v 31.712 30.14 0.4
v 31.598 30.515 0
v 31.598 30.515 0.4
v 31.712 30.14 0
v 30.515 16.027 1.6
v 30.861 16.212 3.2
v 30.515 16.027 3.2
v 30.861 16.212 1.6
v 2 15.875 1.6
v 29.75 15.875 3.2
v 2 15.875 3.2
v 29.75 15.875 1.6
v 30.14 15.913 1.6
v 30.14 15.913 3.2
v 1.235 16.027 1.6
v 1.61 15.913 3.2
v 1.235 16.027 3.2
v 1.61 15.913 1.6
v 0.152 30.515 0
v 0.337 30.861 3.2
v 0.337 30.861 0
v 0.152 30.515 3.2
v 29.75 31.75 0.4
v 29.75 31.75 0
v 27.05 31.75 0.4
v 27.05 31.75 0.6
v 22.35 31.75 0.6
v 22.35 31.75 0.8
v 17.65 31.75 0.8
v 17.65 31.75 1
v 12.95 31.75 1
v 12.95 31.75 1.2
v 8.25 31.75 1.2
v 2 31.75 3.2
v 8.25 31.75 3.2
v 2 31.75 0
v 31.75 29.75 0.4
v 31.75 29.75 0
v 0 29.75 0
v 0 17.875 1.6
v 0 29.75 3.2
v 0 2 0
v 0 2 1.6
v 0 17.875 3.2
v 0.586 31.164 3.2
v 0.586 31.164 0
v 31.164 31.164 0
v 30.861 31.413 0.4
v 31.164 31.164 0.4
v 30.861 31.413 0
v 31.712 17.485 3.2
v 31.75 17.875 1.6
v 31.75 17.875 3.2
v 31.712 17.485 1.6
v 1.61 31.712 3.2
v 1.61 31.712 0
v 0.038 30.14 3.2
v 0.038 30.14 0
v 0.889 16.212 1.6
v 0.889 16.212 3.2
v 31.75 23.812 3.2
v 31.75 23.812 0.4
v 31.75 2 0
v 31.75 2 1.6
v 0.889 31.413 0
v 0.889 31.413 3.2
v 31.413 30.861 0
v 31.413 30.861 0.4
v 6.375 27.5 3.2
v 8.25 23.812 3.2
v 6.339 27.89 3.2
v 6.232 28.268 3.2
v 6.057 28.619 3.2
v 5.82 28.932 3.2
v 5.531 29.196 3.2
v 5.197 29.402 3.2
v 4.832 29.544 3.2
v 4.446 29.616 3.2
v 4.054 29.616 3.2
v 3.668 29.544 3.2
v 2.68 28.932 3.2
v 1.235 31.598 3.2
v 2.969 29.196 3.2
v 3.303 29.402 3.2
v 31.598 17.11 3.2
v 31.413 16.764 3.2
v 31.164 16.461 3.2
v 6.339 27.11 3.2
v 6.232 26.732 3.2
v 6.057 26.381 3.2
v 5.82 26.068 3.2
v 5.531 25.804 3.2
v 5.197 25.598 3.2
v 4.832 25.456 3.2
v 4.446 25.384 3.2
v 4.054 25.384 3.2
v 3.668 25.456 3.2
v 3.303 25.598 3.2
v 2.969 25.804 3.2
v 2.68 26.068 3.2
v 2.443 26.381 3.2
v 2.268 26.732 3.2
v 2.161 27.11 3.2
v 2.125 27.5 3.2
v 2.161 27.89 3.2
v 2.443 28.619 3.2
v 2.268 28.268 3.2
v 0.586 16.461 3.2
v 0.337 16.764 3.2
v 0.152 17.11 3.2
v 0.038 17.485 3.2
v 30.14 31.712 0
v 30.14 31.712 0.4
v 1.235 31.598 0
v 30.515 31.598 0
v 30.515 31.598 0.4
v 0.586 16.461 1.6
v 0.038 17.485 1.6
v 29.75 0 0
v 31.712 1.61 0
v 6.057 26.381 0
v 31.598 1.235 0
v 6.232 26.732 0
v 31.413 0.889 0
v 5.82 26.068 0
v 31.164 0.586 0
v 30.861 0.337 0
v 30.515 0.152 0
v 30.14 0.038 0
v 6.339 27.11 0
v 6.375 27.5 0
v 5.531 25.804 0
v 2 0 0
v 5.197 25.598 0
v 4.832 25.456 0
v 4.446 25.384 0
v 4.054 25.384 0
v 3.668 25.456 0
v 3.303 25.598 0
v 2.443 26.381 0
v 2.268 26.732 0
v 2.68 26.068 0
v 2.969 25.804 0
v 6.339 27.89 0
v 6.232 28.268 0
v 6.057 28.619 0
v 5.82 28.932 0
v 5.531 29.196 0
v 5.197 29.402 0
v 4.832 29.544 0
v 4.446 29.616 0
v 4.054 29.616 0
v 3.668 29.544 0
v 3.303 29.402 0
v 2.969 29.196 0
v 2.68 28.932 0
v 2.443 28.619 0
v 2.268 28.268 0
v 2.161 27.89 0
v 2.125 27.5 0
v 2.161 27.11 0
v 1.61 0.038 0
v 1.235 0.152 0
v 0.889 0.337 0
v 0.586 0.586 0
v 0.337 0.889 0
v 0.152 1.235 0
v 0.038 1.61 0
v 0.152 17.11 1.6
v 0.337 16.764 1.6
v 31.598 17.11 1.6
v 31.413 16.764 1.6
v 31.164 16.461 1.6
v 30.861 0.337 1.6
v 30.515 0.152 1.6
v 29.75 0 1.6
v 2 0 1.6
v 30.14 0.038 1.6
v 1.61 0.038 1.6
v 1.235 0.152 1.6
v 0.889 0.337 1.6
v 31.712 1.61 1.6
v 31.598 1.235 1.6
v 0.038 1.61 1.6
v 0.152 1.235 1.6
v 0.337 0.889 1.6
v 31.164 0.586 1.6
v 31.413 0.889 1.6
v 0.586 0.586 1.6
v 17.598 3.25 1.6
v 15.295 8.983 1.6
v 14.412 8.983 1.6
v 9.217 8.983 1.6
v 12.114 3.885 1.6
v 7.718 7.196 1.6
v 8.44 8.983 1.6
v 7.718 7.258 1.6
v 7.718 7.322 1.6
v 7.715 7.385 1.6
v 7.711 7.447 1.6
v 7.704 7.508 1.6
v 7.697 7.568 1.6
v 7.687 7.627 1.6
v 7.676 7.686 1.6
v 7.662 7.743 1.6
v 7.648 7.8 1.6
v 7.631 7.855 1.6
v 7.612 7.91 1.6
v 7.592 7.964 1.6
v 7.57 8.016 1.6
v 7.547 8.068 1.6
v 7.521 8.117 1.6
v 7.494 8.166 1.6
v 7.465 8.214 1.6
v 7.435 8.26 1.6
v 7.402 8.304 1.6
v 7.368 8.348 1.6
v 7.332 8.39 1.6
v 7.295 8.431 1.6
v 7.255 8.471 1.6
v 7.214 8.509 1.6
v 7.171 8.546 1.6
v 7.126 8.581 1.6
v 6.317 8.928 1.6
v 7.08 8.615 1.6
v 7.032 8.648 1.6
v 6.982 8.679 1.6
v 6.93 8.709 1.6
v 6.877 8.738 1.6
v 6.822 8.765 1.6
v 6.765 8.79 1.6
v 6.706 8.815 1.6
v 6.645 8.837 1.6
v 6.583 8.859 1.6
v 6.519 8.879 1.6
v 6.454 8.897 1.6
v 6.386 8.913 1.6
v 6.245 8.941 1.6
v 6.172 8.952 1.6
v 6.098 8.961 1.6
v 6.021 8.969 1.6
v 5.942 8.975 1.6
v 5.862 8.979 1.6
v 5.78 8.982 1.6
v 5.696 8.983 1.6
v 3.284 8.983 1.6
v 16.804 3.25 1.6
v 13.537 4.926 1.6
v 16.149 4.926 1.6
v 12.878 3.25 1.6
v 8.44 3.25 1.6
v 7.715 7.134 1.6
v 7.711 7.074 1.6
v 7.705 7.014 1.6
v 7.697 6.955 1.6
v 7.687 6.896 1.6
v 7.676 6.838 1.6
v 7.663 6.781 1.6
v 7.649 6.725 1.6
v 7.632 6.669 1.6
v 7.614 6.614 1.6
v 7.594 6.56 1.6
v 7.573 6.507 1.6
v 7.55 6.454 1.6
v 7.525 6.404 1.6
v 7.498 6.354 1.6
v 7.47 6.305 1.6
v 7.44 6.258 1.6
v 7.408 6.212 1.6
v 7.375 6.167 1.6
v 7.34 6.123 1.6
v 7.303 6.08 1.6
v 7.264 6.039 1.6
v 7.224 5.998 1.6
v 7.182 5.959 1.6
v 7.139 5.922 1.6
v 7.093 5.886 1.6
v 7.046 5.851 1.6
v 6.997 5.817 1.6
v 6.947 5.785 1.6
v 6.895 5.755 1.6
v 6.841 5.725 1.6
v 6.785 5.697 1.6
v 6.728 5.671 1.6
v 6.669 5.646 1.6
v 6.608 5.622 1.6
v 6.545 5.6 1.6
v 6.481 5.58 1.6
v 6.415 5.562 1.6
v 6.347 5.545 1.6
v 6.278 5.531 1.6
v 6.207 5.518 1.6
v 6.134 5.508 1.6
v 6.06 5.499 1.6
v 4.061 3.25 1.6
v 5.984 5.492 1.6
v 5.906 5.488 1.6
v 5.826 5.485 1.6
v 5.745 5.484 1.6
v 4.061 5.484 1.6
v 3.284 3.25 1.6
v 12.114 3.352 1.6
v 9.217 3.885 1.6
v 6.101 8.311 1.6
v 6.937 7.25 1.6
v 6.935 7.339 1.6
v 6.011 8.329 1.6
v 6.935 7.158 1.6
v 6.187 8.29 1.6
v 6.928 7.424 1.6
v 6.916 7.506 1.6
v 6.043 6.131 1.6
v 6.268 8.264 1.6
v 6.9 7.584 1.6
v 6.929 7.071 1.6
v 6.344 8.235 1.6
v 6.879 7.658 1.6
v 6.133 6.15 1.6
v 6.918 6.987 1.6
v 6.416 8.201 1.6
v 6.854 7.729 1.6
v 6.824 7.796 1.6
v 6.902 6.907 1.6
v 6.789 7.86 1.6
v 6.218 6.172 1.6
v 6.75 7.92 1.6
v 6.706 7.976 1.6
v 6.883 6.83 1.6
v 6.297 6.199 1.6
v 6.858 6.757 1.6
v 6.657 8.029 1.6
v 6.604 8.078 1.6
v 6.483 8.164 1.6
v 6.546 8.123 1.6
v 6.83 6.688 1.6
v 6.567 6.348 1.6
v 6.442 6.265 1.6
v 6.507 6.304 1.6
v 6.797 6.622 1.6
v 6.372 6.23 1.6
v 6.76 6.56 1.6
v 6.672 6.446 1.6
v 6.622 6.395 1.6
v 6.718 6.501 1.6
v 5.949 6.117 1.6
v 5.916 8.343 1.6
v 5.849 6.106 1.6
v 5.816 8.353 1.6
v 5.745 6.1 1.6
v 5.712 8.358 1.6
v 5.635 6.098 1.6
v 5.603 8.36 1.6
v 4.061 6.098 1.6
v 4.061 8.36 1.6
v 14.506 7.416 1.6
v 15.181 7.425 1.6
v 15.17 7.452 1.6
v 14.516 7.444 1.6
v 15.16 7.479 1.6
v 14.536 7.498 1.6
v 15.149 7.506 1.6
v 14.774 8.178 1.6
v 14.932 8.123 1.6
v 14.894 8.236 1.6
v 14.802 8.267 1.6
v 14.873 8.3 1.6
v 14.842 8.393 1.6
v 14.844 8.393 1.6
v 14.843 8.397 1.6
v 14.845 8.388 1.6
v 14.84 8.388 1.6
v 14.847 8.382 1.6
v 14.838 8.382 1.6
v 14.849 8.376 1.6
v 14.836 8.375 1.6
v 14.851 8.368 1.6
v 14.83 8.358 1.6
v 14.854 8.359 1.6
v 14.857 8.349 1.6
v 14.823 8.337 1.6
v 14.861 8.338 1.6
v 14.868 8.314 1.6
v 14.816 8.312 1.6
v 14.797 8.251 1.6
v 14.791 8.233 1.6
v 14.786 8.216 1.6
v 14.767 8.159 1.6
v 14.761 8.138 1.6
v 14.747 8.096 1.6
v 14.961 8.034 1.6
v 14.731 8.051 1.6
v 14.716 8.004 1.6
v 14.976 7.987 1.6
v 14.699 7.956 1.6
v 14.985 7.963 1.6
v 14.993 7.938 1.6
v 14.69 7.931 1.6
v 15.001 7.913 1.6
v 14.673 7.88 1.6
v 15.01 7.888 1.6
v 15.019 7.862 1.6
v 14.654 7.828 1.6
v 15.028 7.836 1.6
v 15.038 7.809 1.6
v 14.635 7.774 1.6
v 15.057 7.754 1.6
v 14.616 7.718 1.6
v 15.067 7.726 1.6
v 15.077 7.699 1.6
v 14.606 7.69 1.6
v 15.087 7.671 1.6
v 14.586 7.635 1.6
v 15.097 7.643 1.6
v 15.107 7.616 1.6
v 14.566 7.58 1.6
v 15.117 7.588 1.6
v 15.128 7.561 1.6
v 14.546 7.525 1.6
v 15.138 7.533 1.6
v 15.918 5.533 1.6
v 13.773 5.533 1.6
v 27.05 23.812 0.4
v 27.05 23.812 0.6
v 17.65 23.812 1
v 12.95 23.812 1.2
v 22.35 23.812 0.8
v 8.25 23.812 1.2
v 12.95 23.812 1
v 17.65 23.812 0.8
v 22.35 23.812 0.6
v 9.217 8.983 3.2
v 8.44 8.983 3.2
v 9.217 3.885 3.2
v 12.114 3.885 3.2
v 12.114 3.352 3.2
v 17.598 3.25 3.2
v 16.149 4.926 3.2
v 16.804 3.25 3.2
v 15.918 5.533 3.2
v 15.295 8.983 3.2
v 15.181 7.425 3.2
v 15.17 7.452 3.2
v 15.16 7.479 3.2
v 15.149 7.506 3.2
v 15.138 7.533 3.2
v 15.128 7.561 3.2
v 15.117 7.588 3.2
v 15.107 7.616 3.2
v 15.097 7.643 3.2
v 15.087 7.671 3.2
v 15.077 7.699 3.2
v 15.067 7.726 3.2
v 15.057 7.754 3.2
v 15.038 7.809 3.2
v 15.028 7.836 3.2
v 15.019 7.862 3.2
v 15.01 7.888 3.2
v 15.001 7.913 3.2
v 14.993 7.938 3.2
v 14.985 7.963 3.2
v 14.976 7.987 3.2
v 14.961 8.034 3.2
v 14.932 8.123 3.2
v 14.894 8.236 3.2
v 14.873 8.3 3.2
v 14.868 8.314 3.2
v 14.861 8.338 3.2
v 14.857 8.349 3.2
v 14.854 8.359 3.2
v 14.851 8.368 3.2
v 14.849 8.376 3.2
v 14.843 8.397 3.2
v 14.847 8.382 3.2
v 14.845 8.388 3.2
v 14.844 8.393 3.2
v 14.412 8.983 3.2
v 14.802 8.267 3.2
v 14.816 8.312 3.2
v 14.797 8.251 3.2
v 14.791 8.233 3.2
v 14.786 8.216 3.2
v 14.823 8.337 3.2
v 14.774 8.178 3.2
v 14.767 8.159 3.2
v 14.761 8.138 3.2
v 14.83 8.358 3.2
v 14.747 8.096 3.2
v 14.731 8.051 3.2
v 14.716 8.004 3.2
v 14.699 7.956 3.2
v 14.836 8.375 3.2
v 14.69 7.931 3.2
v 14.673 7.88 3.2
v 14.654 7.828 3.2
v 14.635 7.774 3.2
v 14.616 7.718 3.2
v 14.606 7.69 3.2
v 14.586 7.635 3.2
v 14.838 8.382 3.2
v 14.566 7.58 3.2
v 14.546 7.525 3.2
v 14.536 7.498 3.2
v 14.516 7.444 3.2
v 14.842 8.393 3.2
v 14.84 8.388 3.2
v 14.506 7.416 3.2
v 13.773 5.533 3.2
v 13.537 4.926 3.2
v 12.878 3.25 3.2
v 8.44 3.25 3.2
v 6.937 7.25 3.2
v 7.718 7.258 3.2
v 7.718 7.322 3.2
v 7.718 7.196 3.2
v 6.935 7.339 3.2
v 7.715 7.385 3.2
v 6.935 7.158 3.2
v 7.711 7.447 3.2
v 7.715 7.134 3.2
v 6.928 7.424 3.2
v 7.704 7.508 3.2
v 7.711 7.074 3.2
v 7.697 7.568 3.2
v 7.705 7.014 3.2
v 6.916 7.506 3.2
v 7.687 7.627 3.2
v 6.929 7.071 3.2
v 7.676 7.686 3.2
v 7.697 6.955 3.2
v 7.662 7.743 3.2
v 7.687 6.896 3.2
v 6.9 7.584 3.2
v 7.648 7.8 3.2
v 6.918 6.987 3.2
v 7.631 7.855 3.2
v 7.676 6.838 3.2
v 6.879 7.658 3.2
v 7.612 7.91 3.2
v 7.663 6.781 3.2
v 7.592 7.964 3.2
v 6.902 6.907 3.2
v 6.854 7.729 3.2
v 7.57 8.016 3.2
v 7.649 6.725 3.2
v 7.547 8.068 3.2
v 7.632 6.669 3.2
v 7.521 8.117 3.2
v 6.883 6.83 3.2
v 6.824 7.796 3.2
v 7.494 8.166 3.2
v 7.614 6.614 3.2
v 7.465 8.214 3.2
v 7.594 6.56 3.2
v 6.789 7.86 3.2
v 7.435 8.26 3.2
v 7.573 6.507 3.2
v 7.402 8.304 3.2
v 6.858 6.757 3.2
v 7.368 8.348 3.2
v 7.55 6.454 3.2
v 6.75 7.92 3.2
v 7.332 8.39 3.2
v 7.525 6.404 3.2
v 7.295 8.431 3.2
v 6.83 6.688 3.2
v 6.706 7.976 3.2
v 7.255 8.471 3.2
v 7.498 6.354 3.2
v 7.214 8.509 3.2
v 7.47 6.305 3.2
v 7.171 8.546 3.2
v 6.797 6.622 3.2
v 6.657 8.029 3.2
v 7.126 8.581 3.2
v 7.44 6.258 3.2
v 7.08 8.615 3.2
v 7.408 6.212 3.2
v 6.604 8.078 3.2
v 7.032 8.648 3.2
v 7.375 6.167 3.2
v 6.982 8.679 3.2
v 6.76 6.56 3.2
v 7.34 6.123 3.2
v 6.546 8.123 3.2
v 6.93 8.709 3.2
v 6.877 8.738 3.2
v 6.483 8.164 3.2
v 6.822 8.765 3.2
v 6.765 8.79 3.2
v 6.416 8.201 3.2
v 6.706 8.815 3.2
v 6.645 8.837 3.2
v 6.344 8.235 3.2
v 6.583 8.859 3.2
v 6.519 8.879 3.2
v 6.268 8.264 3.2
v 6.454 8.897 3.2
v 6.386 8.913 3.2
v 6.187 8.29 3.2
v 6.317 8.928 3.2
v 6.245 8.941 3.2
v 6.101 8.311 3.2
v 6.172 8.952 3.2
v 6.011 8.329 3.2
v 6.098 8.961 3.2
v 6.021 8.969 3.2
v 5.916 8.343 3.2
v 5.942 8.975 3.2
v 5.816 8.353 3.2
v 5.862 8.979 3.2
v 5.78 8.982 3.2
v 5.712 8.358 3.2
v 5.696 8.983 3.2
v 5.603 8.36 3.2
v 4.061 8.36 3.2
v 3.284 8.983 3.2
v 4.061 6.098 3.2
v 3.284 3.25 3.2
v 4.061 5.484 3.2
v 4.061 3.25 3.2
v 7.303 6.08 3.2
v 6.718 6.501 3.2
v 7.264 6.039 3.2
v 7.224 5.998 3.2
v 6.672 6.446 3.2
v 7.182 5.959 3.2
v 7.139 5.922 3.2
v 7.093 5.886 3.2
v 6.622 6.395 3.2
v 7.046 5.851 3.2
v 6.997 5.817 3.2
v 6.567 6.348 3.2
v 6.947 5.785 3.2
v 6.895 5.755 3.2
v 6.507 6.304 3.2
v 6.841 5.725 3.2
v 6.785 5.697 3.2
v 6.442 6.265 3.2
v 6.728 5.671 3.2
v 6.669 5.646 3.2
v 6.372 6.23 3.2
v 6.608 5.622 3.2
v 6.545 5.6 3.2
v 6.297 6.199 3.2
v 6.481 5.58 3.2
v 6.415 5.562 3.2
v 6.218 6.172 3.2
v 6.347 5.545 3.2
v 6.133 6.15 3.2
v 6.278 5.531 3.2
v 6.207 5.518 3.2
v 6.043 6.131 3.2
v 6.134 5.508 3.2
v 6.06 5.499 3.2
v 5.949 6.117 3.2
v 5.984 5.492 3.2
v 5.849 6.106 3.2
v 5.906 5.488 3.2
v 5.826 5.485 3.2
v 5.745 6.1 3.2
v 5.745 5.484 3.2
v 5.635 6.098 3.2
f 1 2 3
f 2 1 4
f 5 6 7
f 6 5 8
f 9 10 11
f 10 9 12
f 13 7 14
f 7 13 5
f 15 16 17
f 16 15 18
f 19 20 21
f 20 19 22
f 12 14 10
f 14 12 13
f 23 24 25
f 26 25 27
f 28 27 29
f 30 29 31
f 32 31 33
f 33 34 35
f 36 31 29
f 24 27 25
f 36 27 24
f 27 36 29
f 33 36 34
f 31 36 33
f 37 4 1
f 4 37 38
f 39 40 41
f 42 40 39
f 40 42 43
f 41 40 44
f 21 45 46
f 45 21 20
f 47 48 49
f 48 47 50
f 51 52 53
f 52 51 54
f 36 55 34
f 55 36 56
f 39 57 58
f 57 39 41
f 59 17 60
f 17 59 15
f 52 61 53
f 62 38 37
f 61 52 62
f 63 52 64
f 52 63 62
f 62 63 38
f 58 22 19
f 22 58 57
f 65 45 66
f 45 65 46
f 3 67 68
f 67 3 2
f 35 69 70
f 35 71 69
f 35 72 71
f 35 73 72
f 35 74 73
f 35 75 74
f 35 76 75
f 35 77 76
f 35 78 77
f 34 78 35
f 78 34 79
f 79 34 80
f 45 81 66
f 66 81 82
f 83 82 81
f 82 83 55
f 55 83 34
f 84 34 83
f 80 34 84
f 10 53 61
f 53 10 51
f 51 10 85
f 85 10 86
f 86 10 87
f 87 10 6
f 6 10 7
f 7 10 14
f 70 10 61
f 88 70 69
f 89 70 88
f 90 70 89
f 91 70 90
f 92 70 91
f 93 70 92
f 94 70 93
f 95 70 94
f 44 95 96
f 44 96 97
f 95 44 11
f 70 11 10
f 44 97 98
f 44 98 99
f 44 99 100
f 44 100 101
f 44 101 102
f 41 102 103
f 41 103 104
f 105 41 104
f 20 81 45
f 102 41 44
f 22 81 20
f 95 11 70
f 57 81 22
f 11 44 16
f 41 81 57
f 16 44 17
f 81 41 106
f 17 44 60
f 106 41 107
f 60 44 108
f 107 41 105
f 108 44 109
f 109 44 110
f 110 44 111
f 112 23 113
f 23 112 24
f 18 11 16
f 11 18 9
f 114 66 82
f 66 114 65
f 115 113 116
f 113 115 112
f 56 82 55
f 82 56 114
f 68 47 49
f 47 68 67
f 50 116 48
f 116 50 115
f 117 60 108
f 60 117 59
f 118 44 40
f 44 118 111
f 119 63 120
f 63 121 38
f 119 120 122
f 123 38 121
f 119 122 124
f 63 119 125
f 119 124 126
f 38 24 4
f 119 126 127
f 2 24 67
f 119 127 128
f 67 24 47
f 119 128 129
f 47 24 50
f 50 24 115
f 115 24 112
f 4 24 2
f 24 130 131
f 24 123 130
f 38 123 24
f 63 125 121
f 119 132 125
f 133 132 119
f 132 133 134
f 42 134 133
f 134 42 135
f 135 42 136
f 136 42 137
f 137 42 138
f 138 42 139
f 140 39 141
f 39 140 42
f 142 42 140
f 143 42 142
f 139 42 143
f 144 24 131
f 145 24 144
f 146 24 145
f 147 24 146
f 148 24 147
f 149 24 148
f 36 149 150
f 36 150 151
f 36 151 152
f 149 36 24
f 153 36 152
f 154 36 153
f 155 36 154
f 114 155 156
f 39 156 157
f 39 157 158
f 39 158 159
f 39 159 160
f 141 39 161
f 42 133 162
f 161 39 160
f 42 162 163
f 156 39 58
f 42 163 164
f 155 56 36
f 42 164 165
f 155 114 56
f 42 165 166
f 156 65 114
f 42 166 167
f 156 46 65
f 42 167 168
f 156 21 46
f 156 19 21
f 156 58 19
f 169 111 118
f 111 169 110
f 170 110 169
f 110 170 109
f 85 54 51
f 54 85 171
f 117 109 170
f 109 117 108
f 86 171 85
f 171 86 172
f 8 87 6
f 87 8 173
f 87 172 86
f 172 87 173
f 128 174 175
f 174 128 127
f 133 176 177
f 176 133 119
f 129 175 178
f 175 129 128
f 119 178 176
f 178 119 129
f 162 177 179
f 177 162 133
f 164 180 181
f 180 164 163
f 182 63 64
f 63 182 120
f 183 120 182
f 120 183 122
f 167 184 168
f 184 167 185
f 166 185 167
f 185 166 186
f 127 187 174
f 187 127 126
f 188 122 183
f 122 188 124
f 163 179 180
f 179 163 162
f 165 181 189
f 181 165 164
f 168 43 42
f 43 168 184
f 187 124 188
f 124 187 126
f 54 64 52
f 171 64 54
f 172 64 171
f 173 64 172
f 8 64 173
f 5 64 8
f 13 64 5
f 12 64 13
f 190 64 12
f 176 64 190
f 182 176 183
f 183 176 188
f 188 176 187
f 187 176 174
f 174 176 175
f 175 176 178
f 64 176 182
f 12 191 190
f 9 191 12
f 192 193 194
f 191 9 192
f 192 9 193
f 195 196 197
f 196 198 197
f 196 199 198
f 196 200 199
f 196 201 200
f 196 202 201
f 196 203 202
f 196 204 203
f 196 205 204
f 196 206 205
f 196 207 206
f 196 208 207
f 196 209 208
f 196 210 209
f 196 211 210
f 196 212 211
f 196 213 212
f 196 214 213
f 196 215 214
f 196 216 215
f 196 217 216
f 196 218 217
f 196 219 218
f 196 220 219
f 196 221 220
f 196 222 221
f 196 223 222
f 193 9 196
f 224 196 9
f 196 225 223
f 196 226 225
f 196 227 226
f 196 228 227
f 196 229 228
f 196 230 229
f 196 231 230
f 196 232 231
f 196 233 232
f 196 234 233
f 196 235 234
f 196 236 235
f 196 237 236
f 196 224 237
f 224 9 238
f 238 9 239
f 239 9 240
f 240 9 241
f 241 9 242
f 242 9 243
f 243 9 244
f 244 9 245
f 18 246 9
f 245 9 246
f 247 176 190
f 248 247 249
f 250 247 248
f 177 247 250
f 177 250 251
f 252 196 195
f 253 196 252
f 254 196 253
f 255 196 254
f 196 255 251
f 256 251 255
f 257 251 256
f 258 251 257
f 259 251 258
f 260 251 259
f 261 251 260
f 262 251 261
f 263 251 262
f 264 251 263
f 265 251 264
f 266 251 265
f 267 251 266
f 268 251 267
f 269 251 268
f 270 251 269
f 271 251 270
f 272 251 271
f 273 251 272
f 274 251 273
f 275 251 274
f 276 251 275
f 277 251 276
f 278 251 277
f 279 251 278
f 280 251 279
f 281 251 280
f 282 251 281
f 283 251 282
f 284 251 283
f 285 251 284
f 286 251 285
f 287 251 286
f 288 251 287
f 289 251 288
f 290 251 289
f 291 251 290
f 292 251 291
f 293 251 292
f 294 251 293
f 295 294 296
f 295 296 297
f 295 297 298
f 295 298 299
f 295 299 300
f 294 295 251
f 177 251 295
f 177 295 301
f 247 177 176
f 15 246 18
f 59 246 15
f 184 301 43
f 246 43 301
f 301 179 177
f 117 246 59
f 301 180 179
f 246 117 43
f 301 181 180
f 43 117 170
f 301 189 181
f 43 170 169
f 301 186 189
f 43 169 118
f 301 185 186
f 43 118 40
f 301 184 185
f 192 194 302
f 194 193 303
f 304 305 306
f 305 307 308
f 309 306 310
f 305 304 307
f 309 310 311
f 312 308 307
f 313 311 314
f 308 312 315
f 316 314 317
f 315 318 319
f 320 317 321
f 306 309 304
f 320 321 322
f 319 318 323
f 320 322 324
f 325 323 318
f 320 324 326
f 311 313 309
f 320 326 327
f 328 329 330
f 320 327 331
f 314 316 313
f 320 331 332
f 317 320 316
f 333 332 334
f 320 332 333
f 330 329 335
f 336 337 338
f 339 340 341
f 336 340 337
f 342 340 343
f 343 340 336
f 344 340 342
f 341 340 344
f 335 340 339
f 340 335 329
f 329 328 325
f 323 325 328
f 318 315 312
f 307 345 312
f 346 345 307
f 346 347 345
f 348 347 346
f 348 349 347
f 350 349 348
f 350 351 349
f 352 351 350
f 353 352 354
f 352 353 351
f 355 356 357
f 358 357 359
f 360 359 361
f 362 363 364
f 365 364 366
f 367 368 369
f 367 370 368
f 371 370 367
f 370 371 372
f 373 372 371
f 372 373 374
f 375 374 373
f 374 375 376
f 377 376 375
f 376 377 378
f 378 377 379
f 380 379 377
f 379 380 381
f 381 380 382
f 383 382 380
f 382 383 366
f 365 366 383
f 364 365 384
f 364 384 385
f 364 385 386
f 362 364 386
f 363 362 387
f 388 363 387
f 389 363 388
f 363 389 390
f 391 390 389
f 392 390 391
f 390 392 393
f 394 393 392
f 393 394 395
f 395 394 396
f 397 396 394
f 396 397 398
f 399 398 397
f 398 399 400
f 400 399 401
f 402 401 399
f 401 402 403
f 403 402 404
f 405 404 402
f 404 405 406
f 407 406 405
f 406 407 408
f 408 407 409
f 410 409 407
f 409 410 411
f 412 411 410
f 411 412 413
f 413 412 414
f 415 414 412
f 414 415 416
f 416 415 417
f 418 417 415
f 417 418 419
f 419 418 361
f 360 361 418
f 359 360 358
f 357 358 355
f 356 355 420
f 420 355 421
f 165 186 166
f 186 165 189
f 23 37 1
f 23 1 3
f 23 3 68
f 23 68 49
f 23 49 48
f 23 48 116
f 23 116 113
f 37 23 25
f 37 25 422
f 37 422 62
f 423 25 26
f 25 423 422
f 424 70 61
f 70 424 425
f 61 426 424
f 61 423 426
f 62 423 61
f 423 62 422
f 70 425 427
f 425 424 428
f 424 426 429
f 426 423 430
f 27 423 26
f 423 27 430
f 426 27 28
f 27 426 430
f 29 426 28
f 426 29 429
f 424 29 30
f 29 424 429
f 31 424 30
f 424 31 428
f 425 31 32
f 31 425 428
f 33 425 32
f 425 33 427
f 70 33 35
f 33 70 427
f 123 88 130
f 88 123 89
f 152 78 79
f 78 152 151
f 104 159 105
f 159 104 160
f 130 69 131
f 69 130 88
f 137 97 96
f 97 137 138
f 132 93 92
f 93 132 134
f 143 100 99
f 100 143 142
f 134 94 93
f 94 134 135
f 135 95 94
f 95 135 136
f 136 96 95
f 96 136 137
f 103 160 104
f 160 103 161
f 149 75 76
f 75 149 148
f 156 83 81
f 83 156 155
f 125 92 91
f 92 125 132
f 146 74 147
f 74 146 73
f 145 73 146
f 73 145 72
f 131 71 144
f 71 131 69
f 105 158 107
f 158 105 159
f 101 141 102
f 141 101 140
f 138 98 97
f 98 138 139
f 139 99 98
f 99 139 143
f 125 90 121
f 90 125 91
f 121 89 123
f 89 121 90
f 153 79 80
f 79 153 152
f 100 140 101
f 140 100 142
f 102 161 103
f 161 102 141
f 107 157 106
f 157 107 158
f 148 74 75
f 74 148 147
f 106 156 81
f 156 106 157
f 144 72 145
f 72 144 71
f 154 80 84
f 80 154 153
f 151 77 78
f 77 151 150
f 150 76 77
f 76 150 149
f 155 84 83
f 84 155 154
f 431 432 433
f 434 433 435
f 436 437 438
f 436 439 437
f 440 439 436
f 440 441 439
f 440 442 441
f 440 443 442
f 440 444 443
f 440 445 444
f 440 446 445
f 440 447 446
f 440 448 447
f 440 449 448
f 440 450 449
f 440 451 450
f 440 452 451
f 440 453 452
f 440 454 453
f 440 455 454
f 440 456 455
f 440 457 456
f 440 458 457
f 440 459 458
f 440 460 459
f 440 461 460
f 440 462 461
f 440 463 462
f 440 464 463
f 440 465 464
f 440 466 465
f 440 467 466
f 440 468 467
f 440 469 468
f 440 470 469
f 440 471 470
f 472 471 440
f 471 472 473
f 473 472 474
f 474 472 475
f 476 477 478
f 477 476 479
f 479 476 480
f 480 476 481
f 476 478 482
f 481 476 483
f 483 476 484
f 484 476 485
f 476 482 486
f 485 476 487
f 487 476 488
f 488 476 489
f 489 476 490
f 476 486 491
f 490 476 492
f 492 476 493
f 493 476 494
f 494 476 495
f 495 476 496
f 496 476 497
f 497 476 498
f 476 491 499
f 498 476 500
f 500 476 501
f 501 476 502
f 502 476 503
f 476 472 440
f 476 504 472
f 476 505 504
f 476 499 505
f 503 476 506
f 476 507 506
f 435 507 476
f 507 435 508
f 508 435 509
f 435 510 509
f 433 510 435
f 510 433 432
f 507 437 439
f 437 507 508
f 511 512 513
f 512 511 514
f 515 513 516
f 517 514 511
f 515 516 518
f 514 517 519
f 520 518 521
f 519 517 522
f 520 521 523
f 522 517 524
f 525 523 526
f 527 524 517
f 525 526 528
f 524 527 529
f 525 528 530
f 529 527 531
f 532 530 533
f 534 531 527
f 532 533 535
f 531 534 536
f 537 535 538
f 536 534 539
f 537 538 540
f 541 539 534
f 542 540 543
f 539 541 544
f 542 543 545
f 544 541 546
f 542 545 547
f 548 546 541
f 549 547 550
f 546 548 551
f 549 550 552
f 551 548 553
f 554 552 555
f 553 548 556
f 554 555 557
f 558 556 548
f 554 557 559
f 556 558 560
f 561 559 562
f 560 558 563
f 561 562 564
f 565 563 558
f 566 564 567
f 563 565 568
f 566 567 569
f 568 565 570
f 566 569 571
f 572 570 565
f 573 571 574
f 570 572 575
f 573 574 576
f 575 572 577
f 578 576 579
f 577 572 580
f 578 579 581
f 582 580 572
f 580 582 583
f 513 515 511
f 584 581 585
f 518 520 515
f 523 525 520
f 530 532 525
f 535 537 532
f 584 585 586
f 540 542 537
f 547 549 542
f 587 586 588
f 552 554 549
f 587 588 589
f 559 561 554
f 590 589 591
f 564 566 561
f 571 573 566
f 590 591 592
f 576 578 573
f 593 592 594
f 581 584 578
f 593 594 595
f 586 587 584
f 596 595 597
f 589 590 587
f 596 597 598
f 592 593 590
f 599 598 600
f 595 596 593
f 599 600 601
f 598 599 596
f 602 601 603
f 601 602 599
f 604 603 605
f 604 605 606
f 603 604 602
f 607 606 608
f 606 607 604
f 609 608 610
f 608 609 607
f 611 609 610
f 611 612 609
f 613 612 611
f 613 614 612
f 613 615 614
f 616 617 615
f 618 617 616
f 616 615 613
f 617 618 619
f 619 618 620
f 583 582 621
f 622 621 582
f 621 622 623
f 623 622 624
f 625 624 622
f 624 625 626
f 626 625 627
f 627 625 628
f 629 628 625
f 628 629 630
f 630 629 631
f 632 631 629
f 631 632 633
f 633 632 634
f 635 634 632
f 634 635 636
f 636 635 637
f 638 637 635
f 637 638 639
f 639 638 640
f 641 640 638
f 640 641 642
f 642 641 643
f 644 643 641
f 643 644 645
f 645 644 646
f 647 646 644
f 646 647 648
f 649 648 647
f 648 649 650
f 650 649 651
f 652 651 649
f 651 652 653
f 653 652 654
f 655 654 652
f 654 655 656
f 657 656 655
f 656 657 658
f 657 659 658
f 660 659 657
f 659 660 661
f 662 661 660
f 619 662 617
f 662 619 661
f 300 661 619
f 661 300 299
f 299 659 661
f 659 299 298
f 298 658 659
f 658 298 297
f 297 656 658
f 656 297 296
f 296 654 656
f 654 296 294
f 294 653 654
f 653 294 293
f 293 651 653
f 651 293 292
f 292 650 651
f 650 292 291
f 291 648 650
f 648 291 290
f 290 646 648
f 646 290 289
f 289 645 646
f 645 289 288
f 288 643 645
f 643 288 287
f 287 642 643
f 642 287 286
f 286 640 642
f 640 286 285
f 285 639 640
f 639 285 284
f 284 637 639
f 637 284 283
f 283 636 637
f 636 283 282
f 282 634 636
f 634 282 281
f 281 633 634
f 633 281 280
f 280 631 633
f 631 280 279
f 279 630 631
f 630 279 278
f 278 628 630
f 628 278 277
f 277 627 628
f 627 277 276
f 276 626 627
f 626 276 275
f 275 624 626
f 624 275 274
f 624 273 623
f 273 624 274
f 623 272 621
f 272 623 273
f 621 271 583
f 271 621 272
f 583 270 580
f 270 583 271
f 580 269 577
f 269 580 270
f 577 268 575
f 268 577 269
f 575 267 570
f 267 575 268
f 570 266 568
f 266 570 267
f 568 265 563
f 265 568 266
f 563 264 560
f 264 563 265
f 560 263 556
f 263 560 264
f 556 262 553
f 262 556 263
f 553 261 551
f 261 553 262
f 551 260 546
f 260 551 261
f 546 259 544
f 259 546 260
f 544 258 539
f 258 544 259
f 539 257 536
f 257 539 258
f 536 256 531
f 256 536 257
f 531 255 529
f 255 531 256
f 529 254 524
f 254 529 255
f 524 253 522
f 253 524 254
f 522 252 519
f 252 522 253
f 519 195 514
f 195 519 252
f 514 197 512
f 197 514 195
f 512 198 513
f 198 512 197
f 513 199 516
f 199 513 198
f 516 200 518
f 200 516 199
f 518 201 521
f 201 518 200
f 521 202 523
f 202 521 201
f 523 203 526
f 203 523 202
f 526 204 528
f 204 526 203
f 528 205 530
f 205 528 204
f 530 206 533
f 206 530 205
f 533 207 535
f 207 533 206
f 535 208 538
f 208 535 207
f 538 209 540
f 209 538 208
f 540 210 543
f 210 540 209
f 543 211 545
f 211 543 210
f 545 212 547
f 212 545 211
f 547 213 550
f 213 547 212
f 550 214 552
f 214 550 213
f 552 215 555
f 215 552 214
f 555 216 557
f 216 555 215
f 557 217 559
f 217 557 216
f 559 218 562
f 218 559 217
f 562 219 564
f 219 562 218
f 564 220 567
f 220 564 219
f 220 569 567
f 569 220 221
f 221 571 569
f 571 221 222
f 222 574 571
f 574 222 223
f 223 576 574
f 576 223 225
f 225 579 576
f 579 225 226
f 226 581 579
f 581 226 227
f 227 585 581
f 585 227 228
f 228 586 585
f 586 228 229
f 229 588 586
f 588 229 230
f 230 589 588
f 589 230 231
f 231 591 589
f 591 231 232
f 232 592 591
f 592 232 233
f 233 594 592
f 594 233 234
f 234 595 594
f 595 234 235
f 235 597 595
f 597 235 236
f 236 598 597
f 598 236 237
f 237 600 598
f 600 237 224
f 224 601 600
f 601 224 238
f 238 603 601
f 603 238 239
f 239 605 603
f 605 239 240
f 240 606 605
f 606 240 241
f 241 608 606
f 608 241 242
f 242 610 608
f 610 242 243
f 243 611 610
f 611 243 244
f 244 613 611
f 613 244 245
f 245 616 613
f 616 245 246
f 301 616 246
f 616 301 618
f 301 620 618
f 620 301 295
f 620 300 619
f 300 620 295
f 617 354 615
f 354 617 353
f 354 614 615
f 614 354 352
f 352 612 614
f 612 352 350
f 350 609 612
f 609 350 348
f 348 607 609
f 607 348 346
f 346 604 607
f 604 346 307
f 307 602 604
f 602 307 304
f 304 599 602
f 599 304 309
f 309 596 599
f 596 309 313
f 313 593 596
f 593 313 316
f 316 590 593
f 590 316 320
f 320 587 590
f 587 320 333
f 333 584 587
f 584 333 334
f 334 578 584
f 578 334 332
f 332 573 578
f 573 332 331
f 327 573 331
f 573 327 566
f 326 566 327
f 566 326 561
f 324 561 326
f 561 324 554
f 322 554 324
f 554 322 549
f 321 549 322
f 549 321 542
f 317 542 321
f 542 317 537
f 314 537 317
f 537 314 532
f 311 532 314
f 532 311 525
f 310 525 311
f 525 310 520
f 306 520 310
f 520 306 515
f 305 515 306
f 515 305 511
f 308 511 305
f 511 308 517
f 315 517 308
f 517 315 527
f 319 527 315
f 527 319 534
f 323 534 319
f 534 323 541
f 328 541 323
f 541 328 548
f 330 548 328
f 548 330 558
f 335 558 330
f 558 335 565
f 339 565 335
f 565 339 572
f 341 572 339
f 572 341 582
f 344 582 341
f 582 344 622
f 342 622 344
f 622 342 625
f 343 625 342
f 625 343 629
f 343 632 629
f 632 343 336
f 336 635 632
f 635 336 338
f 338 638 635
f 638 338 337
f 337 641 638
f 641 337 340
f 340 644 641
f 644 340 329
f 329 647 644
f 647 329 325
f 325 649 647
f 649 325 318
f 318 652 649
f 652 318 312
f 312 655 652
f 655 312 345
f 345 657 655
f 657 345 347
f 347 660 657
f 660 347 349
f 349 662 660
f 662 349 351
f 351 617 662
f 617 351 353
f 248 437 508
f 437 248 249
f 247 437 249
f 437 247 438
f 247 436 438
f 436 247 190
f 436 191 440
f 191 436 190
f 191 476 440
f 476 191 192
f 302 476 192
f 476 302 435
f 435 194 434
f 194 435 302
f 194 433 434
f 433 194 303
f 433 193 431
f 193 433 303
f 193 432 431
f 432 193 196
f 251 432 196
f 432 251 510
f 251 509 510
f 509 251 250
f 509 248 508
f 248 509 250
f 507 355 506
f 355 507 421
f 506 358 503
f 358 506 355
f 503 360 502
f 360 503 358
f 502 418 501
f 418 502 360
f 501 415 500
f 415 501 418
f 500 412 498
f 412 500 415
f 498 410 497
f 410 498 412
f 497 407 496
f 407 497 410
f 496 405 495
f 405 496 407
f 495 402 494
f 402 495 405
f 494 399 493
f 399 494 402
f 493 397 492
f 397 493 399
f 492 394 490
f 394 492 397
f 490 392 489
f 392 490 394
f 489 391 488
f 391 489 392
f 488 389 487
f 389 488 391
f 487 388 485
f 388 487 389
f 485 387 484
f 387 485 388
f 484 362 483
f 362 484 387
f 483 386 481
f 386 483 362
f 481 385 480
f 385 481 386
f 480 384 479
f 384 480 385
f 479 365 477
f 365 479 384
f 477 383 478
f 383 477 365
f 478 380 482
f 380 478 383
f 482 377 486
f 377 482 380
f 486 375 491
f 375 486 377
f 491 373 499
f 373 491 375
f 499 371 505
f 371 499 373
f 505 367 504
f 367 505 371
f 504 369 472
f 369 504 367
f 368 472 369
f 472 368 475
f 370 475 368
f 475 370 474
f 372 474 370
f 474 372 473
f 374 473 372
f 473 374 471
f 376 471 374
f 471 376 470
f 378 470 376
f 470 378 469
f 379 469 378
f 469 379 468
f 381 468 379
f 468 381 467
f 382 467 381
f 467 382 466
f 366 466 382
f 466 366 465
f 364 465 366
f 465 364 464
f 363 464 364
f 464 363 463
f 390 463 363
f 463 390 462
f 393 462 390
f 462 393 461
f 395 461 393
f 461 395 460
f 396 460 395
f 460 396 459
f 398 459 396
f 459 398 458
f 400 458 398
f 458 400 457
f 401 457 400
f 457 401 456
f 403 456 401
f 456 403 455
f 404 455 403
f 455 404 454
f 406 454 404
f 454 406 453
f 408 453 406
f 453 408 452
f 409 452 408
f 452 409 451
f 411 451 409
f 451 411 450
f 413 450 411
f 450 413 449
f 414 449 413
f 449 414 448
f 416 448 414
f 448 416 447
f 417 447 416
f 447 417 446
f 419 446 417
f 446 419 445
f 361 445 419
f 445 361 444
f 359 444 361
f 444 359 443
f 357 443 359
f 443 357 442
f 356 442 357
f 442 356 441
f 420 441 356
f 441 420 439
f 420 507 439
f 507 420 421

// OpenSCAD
/*
 * Material Swatches rebuilt in OpenSCAD
 * By smkent (GitHub) / bulbasaur0 (Printables)
 *
 * Licensed under Creative Commons CC0 1.0 Universal (Public Domain)
 */

/* [Options] */
Steps = true;
Text = "PLA";
Color = "lightcyan";

module __end_customizer_options__() { }

// Constants //

$fa = $preview ? $fa : 2;
$fs = $preview ? $fs : 0.4;

size = 31.75;
height_thin = 1.6;
height_thick = 3.2;
corner_radius = 2;
hole_diameter = 4.25;
hole_radius = hole_diameter / 2;
hole_inset = hole_radius * 2;
text_origin = 3.25;
text_size = 6;
step_height = size / 4;
step_increment = 0.2;
step_min = 0.2;
step_count = 5;
step_width = 23.5 / step_count;

// Modules //

module rounded_square(x, y, radius) {
    offset(radius)
    offset(-radius)
    square([x, y]);
}

module swatch() {
    difference() {
        union() {
            linear_extrude(height=height_thick)
            translate([0, size / 2])
            rounded_square(size, size / 2, corner_radius);
            linear_extrude(height=height_thin)
            rounded_square(size, size, corner_radius);
        }
        linear_extrude(height=height_thick)
        translate([hole_inset, size - hole_inset])
        circle(hole_radius);
        if (Steps) {
            for (i = [1:1:step_count]) {
                xoff = size - step_width * i;
                yoff = size - step_height;
                // echo("i", i, 0.2 * i, xoff, yoff);
                step_thickness = step_min + step_increment * i;
                translate([xoff, yoff, step_thickness])
                linear_extrude(height = height_thick - step_thickness)
                square([step_width + 0.01, step_height]);
            }
        }
    }
    translate([text_origin * 0.8, text_origin, height_thin])
    linear_extrude(height=height_thin)
    text(Text, font="Liberation Sans", size=text_size, spacing=0.95);
}

module main() {
    color(Color, 0.8)
    render()
    swatch();
}

main();
